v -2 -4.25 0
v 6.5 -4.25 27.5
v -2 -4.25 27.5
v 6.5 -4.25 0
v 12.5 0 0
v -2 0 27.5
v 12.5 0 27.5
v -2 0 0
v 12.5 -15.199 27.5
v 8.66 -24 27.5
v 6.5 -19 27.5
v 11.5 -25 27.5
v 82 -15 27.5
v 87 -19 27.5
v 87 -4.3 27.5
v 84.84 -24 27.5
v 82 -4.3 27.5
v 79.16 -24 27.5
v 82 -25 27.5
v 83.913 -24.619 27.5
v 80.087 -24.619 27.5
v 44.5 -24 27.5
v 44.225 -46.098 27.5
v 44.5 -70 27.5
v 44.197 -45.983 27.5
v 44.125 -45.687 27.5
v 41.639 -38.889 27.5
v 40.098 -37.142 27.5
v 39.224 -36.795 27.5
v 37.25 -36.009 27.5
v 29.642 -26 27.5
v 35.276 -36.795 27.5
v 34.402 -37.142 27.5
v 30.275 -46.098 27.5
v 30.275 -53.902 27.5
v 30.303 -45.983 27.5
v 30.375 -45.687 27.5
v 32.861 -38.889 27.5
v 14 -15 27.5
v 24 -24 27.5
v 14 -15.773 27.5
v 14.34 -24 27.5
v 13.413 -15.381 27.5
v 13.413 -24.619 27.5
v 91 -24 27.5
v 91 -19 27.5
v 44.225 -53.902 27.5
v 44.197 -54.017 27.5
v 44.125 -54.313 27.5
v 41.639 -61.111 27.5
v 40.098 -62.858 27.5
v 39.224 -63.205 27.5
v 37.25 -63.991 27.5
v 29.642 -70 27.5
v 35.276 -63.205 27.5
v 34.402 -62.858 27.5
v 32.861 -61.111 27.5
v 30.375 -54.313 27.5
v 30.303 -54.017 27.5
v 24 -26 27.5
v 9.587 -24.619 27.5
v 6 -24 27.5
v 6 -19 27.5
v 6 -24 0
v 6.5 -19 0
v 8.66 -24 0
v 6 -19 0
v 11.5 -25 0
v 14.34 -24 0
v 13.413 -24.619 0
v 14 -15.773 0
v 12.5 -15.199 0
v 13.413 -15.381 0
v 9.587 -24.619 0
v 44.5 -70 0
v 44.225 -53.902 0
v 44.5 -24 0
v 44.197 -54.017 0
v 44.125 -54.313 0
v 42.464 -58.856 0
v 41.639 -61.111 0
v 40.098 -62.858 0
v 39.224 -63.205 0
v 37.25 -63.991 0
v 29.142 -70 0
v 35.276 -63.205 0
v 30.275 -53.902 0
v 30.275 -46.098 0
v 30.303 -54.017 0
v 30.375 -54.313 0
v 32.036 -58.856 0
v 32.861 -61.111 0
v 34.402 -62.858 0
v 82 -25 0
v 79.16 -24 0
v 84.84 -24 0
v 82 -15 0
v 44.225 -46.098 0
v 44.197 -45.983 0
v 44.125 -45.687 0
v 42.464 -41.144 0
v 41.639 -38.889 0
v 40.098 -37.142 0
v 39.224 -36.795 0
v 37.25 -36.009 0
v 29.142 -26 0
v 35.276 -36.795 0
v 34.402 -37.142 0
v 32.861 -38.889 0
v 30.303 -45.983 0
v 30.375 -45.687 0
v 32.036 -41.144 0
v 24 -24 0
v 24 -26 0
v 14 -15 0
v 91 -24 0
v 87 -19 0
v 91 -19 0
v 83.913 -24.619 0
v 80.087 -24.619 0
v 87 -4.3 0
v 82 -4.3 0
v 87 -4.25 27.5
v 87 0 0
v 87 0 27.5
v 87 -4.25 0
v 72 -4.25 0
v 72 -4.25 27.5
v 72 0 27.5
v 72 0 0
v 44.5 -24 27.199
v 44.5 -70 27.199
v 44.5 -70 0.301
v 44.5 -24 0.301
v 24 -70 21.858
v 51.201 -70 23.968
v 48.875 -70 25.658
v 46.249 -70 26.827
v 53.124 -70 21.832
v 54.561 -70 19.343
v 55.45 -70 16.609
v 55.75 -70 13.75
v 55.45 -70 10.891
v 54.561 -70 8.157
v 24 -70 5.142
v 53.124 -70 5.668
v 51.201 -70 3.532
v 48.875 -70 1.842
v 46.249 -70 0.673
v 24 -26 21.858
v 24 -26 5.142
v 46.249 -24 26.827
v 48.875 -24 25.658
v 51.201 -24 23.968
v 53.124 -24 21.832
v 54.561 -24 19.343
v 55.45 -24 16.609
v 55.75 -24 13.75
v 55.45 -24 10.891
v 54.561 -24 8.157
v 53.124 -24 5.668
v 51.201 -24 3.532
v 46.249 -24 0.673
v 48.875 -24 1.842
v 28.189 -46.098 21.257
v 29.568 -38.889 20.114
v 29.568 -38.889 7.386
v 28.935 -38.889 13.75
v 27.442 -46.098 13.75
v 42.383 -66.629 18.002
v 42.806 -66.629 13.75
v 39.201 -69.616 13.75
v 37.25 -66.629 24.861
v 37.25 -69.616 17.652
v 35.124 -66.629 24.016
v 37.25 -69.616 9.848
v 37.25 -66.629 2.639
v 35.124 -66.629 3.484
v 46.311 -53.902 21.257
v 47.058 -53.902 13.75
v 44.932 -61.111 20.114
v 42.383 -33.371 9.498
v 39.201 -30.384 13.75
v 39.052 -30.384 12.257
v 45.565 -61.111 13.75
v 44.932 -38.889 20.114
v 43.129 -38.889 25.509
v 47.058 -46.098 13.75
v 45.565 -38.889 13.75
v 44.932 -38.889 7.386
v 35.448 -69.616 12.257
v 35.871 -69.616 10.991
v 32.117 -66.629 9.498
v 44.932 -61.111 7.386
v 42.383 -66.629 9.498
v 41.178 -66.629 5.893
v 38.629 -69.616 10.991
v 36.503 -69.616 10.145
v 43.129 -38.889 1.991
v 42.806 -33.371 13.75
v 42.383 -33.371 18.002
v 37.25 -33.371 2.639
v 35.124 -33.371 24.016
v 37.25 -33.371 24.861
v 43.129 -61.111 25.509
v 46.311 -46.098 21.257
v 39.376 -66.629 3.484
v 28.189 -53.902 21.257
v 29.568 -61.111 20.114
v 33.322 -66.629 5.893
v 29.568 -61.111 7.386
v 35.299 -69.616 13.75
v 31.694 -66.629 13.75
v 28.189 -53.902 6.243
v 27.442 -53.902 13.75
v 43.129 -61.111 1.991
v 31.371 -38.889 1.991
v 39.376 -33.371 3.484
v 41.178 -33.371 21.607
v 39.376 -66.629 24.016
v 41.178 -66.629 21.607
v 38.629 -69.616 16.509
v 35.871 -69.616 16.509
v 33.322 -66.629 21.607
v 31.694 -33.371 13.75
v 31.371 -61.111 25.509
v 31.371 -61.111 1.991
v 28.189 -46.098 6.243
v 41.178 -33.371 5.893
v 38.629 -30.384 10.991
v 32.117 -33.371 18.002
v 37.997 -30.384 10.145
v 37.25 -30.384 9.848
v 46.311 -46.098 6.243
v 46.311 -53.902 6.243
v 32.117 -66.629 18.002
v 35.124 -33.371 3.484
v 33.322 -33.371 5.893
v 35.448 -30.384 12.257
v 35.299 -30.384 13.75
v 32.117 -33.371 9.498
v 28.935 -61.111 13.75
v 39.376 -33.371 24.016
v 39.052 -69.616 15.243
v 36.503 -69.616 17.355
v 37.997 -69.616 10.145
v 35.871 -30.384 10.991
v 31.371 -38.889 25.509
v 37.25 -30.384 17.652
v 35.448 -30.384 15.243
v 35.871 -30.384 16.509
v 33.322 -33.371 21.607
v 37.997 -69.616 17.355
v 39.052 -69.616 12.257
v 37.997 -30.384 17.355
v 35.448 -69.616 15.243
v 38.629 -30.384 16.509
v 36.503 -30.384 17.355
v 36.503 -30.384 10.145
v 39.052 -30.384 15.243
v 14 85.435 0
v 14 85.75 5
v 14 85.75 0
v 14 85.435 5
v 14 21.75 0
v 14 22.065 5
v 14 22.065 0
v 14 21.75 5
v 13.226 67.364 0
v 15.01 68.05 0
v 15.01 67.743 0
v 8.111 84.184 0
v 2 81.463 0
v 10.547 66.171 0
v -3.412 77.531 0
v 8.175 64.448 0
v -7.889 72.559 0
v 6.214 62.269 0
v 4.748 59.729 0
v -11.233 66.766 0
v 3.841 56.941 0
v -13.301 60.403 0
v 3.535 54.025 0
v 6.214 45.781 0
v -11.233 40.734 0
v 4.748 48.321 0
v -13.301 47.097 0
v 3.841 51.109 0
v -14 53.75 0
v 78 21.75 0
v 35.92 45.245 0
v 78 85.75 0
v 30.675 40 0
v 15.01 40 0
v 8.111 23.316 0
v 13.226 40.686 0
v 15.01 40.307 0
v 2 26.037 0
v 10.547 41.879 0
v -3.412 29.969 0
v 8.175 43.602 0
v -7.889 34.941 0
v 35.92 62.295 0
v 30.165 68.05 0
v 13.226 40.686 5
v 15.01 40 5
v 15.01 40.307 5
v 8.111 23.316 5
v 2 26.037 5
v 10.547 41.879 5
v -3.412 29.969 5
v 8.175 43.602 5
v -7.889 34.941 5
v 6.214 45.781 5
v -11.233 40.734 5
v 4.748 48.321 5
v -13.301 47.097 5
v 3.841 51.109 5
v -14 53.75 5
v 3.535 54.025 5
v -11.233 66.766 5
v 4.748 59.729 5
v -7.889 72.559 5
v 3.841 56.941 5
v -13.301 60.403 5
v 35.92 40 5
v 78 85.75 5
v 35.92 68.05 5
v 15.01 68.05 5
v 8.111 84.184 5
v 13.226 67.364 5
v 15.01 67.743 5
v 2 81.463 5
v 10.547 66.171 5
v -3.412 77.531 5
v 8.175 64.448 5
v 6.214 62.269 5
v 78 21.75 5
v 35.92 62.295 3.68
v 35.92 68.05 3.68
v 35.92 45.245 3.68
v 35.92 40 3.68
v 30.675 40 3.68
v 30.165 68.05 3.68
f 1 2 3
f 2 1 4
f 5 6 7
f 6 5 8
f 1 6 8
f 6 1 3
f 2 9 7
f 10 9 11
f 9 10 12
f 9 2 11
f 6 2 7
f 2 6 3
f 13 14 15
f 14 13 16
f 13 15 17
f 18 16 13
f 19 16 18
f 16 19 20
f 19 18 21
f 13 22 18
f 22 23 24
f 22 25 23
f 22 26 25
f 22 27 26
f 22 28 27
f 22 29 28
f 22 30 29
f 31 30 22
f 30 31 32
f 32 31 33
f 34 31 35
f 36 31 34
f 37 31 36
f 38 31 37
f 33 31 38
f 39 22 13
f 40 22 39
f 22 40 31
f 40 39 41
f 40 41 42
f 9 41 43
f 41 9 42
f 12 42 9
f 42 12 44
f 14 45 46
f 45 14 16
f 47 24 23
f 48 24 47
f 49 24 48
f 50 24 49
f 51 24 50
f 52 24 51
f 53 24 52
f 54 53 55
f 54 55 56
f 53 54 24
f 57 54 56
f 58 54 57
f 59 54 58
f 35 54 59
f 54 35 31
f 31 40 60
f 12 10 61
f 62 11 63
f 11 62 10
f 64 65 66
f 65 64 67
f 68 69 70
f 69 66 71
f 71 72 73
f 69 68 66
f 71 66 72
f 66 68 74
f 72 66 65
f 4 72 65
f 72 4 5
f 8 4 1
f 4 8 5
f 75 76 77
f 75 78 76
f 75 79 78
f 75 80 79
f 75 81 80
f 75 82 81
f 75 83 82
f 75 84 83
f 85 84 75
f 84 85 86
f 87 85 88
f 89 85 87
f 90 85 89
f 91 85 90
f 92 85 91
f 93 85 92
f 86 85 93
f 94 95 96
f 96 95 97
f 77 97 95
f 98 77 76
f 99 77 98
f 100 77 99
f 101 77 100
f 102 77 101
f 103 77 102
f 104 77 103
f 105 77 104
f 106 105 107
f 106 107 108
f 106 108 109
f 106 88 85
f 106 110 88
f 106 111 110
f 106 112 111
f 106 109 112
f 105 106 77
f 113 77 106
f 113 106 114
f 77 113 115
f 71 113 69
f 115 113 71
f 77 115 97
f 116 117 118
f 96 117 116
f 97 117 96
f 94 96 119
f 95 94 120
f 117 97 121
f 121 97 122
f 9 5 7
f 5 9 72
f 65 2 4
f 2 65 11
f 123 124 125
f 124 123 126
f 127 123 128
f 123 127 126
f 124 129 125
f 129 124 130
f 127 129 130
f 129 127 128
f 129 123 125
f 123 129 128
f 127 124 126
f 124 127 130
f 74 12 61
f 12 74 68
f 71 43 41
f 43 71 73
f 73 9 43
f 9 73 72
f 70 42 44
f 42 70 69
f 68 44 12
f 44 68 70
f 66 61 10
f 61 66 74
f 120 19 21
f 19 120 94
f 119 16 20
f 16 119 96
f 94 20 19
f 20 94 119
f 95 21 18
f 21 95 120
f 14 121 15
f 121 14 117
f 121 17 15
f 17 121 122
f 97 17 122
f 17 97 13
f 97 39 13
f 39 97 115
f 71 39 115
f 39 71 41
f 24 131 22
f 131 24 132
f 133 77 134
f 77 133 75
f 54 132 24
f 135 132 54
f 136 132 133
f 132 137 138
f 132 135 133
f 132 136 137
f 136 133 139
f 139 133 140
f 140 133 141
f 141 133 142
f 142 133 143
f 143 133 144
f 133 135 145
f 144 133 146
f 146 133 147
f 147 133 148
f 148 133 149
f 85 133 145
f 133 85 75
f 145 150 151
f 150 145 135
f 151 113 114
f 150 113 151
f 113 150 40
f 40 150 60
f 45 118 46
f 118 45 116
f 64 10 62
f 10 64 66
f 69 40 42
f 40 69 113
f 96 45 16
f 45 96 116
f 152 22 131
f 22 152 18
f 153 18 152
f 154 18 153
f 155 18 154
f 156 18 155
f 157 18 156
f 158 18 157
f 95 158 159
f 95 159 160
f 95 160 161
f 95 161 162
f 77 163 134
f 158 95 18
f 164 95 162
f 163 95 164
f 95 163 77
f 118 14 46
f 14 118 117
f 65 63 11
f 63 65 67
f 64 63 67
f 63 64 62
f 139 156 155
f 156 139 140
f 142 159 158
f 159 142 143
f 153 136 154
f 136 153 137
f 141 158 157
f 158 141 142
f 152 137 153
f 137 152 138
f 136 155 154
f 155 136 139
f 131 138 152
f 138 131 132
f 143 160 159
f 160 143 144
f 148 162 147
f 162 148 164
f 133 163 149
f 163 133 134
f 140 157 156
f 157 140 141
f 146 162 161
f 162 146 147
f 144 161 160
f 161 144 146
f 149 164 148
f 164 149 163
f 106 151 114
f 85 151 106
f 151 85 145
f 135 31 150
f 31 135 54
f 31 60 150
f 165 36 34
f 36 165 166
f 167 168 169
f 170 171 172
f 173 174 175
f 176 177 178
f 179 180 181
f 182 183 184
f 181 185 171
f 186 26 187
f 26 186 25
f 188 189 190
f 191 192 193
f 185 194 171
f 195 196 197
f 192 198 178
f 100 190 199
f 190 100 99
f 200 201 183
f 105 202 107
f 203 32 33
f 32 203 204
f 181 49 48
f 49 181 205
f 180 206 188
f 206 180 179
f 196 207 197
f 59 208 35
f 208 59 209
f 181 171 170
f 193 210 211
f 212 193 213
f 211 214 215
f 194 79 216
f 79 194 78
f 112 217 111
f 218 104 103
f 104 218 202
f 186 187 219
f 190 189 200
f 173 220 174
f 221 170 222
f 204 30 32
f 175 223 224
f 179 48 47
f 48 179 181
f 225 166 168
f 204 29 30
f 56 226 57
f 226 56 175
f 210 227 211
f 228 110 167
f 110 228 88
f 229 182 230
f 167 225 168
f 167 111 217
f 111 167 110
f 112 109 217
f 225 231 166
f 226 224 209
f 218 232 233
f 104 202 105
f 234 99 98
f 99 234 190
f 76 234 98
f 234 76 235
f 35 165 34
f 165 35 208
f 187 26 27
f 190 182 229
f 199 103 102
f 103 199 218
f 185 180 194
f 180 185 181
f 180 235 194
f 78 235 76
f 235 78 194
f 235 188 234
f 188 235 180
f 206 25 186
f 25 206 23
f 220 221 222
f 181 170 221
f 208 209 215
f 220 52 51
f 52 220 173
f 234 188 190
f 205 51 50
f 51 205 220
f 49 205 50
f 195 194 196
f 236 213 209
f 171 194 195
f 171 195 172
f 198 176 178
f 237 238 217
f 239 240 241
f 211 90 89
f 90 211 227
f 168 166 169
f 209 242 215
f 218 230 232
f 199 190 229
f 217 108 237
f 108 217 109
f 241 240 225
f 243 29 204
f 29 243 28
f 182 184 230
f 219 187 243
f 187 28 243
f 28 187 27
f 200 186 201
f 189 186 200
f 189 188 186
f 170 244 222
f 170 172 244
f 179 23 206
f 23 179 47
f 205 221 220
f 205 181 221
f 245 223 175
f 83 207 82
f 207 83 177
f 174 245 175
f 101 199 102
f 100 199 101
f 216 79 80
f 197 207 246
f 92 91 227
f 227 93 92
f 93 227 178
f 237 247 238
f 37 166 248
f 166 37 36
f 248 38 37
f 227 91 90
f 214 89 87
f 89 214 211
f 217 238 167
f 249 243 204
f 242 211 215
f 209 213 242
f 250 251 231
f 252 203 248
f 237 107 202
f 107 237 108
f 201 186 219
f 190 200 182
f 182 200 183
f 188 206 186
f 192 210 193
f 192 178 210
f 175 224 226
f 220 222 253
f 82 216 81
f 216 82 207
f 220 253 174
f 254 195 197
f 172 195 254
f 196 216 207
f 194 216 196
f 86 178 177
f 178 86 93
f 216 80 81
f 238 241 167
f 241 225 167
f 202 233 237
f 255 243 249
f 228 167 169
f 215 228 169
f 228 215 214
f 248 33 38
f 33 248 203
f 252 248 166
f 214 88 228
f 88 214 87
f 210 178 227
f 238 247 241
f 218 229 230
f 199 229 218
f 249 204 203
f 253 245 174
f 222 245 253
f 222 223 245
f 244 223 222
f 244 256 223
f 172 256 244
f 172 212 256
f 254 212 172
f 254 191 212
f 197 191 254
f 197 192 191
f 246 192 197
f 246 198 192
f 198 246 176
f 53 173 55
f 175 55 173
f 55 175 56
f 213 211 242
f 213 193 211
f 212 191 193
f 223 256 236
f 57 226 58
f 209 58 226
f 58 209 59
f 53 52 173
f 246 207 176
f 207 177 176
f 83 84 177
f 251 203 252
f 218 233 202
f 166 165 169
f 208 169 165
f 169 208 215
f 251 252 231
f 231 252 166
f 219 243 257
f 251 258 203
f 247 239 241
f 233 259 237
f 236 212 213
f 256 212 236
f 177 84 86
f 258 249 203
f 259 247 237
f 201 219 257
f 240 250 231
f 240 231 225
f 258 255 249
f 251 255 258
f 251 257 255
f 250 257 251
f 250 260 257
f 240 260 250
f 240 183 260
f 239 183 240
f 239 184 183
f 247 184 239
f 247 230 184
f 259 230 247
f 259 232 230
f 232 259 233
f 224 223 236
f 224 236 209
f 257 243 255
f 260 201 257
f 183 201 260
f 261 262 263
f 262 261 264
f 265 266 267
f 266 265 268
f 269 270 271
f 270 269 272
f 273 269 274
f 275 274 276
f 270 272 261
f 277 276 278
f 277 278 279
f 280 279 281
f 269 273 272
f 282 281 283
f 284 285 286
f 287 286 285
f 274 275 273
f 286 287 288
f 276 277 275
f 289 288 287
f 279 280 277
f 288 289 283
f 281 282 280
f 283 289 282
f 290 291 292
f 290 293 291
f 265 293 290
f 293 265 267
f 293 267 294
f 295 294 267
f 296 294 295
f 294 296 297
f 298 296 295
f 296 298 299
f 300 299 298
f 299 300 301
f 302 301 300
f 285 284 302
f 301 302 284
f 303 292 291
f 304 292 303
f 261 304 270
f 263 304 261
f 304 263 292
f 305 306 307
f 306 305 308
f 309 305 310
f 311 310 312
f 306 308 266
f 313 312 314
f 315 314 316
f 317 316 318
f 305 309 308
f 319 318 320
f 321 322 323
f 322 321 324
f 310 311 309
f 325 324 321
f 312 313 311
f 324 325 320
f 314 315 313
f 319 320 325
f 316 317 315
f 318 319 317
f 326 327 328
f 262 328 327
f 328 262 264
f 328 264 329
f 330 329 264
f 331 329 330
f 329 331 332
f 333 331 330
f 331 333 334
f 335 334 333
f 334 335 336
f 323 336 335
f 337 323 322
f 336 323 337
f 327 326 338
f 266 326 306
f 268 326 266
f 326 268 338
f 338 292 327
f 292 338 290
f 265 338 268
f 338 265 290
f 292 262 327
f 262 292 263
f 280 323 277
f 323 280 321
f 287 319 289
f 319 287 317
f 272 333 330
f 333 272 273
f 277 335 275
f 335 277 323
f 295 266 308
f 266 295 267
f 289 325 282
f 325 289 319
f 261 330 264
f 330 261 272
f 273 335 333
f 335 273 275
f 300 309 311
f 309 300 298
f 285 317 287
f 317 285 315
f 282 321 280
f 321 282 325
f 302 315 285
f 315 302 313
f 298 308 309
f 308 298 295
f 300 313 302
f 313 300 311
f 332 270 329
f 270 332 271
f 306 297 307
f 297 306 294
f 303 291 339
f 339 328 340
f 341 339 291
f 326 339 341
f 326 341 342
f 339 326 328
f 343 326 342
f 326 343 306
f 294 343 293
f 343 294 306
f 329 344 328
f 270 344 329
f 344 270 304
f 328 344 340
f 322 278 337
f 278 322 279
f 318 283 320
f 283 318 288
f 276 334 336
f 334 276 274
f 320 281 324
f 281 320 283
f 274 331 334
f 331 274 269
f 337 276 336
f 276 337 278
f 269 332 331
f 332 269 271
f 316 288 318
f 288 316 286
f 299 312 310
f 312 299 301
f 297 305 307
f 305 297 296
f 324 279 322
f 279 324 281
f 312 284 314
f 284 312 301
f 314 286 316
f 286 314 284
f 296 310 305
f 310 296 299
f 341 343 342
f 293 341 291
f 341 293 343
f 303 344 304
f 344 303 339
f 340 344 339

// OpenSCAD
module halfcylinder(r,h)
{
    difference(){
       cylinder(r=r,h=h);
       translate([0,0-r,0-.5]) cube([r*2+1,r*2+1,h+1]);
    } 
}

module thirdcylinder(r,h)
{
    difference(){
       cylinder(r=r*2,h=h);
       translate([0-r/1.5,0-2*r,0-.5]) cube([r*4+1,r*4+1,h+1]);
    } 
}
module gearmount(thewidth)
{
    translate([-2,0,0])   cube([14,thewidth,4.25]);
    translate([8-1.5,0,0])  cube([6,thewidth,19.6]);
    
    translate([72,0,0])  cube([15,thewidth,4.25]);
    translate([13-1.5,0,20]) rotate([-90,0,0]) cylinder(r=5,h=thewidth); 
   
    translate([82,0,20]) rotate([-90,0,0]) cylinder(r=5,h=thewidth); 
     
    translate([82,0,4.3])  cube([5,thewidth,15.6]);
   
    translate([14,0,15]) cube([69,thewidth,4.25]);
    
}


module batterysupport(xwidth)
{
       
         rotate([0,90,0]) translate([-128,-32+xwidth/2,15]) cube([64,64,5]);
         rotate([0,90,0]) translate([-68,xwidth/2,15]) cylinder(r=32,h=5);
       
    
}

module battery_plate(xwidth)
{
    difference(){
        batterysupport(xwidth);
        rotate([0,0,0]) translate([0,0,90]) scale([1.02,1.02,1.02]) battery_stud(xwidth);
        //rotate([0,90,-90]) translate([40,10,-8]) cube([xwidth,xwidth,10]);
    }
        
}

module battery_stud_body(thewidth)
{
   offset = (thewidth / 2 ) - 7.75;
  // %rotate([0,90,0]) translate([0,0,10]) cube([35.85,thewidth,50]);
   rotate([0,90,0]) translate([4,0,10]) cube([thewidth-7,thewidth,50]);
   rotate([0,90,0]) translate([-14,0,9]) cube([85,thewidth,5]);
   rotate([0,90,0]) translate([22,thewidth/2,10]) cylinder(r=thewidth/2,h=50);    
}

module battery_stud(thewidth)
{
   difference(){
     battery_stud_body(thewidth);
     rotate([0,90,0]) translate([-9,4,16]) rotate([0,0,-45]) cube([thewidth-4,10,51]);
     rotate([0,90,0]) translate([-9+thewidth-8,thewidth+15,16]) rotate([0,0, 180+45]) cube([thewidth-6,10,51]);
    rotate([0,90,0]) translate([17.25,thewidth/2,40]) scale([2.0,4.0,4.0]) sphere(r=5.0);   
   }
}   
   
module brace(thewidth)
{   hull(){
      translate([-50,0,-10]) cube([thewidth/2,thewidth,2]);
      rotate([0,90,0]) translate([-90,0,10]) cube([thewidth,thewidth,2]);
       }
      hull(){
       translate([-18,0,25]) cube([thewidth/2,thewidth,2]);   
       rotate([0,90,0]) translate([-32,0,10]) cube([thewidth/2,thewidth,2]);
      }
}


module Ushape(ur1, ur2 ,uh) {

    // Circle resolution
    cRes = 30;
    // Extrusion resolution
    eRes = 50;

    union(){
        // The rounded part
        rotate_extrude(angle=180, convexity=10, $fn=eRes)
               translate([ur2, 0]) circle(ur1, $fn=cRes);

        // U extensions
        rotate([90,0,0]) linear_extrude(height=uh,$fn=eRes)
               translate([ur2, 0]) circle(ur1, $fn=cRes);
        rotate([90,0,0]) linear_extrude(height=uh,$fn=eRes)
               translate([-ur2, 0]) circle(ur1, $fn=cRes);
    }

}


module dewalt_you(xwidth)
{
    rotate([0,90,0]) translate([0-xwidth+25/2,-45,50]) Ushape(5,(xwidth+10+2)/2,40);
    hull(){
       translate([55,-20,-5]) cylinder(r=5,h=xwidth+20);
       translate([45,-20,-5]) cylinder(r=5,h=xwidth+20);     
       translate([50,-20,-5]) cylinder(r=5,h=xwidth+20);  
       translate([50,-30,-5]) cylinder(r=5,h=xwidth+20);  
      }    
    
}

module dewalt_upper(xwidth)
{
        translate([-23.5,0,0]) dewalt_you(xwidth);
        translate([ 23+.6,0,0]) dewalt_you(xwidth);
        rotate([180,0,0]) translate([xwidth+15,125-1,-48+1.8]) Ushape(5,(xwidth+10+2)/2,40);
        rotate([180,0,0]) translate([xwidth+15,125-1,1]) Ushape(5,(xwidth+10+2)/2,40);
}

module dewalt_base(xwidth)
{
    rotate([90,0,0]) translate([0,-5,0])gearmount(xwidth+20);
    rotate([90,0,0]) translate([15-5,-5,15+4.5]) cube([90,xwidth+20,18]);
}

module dewalt_lower(xwidth)
{
    difference(){
          dewalt_base(xwidth);
          translate([2,-5-1,0]) scale([1.02,1.02,1.02]) dewalt_upper(xwidth);
      }
}

module dewalt_holder(xwidth)
{   
      dewalt_lower(xwidth);
      %translate([2,-5-1,0]) dewalt_upper(xwidth);
      rotate([-90,0,0]) translate([120,20,-50]) dewalt_upper(xwidth);
      
}
module sander_holder()
{
    xwidth = 27.5;
    rotate([90,0,0]) gearmount(xwidth);
    rotate([90,0,0]) translate([0,0,90]) battery_stud(xwidth);
    rotate([90,0,0]) translate([0,0,0]) brace(xwidth);
    %rotate([90,0,0]) translate([-1,0,0]) battery_plate(xwidth);
    rotate([0,90,0]) translate([-20,40,-50]) battery_plate(xwidth);
}

module saw_holder()
{
    xwidth = 27.5;
    rotate([90,0,0]) gearmount(xwidth);
    rotate([90,0,-90]) translate([10,0,-20]) battery_stud(xwidth);
    //rotate([90,0,0]) translate([0,0,0]) brace(xwidth);
    %rotate([90,0,-90]) translate([10,0,-110]) battery_plate(xwidth);
    rotate([0,90,0]) translate([-20,40,-50]) battery_plate(xwidth);
}
//battery_stud(27.4);
saw_holder();
//sander_holder();
//dewalt_holder(35);
//dewalt_lower(35);
//gearmount(15.7);
